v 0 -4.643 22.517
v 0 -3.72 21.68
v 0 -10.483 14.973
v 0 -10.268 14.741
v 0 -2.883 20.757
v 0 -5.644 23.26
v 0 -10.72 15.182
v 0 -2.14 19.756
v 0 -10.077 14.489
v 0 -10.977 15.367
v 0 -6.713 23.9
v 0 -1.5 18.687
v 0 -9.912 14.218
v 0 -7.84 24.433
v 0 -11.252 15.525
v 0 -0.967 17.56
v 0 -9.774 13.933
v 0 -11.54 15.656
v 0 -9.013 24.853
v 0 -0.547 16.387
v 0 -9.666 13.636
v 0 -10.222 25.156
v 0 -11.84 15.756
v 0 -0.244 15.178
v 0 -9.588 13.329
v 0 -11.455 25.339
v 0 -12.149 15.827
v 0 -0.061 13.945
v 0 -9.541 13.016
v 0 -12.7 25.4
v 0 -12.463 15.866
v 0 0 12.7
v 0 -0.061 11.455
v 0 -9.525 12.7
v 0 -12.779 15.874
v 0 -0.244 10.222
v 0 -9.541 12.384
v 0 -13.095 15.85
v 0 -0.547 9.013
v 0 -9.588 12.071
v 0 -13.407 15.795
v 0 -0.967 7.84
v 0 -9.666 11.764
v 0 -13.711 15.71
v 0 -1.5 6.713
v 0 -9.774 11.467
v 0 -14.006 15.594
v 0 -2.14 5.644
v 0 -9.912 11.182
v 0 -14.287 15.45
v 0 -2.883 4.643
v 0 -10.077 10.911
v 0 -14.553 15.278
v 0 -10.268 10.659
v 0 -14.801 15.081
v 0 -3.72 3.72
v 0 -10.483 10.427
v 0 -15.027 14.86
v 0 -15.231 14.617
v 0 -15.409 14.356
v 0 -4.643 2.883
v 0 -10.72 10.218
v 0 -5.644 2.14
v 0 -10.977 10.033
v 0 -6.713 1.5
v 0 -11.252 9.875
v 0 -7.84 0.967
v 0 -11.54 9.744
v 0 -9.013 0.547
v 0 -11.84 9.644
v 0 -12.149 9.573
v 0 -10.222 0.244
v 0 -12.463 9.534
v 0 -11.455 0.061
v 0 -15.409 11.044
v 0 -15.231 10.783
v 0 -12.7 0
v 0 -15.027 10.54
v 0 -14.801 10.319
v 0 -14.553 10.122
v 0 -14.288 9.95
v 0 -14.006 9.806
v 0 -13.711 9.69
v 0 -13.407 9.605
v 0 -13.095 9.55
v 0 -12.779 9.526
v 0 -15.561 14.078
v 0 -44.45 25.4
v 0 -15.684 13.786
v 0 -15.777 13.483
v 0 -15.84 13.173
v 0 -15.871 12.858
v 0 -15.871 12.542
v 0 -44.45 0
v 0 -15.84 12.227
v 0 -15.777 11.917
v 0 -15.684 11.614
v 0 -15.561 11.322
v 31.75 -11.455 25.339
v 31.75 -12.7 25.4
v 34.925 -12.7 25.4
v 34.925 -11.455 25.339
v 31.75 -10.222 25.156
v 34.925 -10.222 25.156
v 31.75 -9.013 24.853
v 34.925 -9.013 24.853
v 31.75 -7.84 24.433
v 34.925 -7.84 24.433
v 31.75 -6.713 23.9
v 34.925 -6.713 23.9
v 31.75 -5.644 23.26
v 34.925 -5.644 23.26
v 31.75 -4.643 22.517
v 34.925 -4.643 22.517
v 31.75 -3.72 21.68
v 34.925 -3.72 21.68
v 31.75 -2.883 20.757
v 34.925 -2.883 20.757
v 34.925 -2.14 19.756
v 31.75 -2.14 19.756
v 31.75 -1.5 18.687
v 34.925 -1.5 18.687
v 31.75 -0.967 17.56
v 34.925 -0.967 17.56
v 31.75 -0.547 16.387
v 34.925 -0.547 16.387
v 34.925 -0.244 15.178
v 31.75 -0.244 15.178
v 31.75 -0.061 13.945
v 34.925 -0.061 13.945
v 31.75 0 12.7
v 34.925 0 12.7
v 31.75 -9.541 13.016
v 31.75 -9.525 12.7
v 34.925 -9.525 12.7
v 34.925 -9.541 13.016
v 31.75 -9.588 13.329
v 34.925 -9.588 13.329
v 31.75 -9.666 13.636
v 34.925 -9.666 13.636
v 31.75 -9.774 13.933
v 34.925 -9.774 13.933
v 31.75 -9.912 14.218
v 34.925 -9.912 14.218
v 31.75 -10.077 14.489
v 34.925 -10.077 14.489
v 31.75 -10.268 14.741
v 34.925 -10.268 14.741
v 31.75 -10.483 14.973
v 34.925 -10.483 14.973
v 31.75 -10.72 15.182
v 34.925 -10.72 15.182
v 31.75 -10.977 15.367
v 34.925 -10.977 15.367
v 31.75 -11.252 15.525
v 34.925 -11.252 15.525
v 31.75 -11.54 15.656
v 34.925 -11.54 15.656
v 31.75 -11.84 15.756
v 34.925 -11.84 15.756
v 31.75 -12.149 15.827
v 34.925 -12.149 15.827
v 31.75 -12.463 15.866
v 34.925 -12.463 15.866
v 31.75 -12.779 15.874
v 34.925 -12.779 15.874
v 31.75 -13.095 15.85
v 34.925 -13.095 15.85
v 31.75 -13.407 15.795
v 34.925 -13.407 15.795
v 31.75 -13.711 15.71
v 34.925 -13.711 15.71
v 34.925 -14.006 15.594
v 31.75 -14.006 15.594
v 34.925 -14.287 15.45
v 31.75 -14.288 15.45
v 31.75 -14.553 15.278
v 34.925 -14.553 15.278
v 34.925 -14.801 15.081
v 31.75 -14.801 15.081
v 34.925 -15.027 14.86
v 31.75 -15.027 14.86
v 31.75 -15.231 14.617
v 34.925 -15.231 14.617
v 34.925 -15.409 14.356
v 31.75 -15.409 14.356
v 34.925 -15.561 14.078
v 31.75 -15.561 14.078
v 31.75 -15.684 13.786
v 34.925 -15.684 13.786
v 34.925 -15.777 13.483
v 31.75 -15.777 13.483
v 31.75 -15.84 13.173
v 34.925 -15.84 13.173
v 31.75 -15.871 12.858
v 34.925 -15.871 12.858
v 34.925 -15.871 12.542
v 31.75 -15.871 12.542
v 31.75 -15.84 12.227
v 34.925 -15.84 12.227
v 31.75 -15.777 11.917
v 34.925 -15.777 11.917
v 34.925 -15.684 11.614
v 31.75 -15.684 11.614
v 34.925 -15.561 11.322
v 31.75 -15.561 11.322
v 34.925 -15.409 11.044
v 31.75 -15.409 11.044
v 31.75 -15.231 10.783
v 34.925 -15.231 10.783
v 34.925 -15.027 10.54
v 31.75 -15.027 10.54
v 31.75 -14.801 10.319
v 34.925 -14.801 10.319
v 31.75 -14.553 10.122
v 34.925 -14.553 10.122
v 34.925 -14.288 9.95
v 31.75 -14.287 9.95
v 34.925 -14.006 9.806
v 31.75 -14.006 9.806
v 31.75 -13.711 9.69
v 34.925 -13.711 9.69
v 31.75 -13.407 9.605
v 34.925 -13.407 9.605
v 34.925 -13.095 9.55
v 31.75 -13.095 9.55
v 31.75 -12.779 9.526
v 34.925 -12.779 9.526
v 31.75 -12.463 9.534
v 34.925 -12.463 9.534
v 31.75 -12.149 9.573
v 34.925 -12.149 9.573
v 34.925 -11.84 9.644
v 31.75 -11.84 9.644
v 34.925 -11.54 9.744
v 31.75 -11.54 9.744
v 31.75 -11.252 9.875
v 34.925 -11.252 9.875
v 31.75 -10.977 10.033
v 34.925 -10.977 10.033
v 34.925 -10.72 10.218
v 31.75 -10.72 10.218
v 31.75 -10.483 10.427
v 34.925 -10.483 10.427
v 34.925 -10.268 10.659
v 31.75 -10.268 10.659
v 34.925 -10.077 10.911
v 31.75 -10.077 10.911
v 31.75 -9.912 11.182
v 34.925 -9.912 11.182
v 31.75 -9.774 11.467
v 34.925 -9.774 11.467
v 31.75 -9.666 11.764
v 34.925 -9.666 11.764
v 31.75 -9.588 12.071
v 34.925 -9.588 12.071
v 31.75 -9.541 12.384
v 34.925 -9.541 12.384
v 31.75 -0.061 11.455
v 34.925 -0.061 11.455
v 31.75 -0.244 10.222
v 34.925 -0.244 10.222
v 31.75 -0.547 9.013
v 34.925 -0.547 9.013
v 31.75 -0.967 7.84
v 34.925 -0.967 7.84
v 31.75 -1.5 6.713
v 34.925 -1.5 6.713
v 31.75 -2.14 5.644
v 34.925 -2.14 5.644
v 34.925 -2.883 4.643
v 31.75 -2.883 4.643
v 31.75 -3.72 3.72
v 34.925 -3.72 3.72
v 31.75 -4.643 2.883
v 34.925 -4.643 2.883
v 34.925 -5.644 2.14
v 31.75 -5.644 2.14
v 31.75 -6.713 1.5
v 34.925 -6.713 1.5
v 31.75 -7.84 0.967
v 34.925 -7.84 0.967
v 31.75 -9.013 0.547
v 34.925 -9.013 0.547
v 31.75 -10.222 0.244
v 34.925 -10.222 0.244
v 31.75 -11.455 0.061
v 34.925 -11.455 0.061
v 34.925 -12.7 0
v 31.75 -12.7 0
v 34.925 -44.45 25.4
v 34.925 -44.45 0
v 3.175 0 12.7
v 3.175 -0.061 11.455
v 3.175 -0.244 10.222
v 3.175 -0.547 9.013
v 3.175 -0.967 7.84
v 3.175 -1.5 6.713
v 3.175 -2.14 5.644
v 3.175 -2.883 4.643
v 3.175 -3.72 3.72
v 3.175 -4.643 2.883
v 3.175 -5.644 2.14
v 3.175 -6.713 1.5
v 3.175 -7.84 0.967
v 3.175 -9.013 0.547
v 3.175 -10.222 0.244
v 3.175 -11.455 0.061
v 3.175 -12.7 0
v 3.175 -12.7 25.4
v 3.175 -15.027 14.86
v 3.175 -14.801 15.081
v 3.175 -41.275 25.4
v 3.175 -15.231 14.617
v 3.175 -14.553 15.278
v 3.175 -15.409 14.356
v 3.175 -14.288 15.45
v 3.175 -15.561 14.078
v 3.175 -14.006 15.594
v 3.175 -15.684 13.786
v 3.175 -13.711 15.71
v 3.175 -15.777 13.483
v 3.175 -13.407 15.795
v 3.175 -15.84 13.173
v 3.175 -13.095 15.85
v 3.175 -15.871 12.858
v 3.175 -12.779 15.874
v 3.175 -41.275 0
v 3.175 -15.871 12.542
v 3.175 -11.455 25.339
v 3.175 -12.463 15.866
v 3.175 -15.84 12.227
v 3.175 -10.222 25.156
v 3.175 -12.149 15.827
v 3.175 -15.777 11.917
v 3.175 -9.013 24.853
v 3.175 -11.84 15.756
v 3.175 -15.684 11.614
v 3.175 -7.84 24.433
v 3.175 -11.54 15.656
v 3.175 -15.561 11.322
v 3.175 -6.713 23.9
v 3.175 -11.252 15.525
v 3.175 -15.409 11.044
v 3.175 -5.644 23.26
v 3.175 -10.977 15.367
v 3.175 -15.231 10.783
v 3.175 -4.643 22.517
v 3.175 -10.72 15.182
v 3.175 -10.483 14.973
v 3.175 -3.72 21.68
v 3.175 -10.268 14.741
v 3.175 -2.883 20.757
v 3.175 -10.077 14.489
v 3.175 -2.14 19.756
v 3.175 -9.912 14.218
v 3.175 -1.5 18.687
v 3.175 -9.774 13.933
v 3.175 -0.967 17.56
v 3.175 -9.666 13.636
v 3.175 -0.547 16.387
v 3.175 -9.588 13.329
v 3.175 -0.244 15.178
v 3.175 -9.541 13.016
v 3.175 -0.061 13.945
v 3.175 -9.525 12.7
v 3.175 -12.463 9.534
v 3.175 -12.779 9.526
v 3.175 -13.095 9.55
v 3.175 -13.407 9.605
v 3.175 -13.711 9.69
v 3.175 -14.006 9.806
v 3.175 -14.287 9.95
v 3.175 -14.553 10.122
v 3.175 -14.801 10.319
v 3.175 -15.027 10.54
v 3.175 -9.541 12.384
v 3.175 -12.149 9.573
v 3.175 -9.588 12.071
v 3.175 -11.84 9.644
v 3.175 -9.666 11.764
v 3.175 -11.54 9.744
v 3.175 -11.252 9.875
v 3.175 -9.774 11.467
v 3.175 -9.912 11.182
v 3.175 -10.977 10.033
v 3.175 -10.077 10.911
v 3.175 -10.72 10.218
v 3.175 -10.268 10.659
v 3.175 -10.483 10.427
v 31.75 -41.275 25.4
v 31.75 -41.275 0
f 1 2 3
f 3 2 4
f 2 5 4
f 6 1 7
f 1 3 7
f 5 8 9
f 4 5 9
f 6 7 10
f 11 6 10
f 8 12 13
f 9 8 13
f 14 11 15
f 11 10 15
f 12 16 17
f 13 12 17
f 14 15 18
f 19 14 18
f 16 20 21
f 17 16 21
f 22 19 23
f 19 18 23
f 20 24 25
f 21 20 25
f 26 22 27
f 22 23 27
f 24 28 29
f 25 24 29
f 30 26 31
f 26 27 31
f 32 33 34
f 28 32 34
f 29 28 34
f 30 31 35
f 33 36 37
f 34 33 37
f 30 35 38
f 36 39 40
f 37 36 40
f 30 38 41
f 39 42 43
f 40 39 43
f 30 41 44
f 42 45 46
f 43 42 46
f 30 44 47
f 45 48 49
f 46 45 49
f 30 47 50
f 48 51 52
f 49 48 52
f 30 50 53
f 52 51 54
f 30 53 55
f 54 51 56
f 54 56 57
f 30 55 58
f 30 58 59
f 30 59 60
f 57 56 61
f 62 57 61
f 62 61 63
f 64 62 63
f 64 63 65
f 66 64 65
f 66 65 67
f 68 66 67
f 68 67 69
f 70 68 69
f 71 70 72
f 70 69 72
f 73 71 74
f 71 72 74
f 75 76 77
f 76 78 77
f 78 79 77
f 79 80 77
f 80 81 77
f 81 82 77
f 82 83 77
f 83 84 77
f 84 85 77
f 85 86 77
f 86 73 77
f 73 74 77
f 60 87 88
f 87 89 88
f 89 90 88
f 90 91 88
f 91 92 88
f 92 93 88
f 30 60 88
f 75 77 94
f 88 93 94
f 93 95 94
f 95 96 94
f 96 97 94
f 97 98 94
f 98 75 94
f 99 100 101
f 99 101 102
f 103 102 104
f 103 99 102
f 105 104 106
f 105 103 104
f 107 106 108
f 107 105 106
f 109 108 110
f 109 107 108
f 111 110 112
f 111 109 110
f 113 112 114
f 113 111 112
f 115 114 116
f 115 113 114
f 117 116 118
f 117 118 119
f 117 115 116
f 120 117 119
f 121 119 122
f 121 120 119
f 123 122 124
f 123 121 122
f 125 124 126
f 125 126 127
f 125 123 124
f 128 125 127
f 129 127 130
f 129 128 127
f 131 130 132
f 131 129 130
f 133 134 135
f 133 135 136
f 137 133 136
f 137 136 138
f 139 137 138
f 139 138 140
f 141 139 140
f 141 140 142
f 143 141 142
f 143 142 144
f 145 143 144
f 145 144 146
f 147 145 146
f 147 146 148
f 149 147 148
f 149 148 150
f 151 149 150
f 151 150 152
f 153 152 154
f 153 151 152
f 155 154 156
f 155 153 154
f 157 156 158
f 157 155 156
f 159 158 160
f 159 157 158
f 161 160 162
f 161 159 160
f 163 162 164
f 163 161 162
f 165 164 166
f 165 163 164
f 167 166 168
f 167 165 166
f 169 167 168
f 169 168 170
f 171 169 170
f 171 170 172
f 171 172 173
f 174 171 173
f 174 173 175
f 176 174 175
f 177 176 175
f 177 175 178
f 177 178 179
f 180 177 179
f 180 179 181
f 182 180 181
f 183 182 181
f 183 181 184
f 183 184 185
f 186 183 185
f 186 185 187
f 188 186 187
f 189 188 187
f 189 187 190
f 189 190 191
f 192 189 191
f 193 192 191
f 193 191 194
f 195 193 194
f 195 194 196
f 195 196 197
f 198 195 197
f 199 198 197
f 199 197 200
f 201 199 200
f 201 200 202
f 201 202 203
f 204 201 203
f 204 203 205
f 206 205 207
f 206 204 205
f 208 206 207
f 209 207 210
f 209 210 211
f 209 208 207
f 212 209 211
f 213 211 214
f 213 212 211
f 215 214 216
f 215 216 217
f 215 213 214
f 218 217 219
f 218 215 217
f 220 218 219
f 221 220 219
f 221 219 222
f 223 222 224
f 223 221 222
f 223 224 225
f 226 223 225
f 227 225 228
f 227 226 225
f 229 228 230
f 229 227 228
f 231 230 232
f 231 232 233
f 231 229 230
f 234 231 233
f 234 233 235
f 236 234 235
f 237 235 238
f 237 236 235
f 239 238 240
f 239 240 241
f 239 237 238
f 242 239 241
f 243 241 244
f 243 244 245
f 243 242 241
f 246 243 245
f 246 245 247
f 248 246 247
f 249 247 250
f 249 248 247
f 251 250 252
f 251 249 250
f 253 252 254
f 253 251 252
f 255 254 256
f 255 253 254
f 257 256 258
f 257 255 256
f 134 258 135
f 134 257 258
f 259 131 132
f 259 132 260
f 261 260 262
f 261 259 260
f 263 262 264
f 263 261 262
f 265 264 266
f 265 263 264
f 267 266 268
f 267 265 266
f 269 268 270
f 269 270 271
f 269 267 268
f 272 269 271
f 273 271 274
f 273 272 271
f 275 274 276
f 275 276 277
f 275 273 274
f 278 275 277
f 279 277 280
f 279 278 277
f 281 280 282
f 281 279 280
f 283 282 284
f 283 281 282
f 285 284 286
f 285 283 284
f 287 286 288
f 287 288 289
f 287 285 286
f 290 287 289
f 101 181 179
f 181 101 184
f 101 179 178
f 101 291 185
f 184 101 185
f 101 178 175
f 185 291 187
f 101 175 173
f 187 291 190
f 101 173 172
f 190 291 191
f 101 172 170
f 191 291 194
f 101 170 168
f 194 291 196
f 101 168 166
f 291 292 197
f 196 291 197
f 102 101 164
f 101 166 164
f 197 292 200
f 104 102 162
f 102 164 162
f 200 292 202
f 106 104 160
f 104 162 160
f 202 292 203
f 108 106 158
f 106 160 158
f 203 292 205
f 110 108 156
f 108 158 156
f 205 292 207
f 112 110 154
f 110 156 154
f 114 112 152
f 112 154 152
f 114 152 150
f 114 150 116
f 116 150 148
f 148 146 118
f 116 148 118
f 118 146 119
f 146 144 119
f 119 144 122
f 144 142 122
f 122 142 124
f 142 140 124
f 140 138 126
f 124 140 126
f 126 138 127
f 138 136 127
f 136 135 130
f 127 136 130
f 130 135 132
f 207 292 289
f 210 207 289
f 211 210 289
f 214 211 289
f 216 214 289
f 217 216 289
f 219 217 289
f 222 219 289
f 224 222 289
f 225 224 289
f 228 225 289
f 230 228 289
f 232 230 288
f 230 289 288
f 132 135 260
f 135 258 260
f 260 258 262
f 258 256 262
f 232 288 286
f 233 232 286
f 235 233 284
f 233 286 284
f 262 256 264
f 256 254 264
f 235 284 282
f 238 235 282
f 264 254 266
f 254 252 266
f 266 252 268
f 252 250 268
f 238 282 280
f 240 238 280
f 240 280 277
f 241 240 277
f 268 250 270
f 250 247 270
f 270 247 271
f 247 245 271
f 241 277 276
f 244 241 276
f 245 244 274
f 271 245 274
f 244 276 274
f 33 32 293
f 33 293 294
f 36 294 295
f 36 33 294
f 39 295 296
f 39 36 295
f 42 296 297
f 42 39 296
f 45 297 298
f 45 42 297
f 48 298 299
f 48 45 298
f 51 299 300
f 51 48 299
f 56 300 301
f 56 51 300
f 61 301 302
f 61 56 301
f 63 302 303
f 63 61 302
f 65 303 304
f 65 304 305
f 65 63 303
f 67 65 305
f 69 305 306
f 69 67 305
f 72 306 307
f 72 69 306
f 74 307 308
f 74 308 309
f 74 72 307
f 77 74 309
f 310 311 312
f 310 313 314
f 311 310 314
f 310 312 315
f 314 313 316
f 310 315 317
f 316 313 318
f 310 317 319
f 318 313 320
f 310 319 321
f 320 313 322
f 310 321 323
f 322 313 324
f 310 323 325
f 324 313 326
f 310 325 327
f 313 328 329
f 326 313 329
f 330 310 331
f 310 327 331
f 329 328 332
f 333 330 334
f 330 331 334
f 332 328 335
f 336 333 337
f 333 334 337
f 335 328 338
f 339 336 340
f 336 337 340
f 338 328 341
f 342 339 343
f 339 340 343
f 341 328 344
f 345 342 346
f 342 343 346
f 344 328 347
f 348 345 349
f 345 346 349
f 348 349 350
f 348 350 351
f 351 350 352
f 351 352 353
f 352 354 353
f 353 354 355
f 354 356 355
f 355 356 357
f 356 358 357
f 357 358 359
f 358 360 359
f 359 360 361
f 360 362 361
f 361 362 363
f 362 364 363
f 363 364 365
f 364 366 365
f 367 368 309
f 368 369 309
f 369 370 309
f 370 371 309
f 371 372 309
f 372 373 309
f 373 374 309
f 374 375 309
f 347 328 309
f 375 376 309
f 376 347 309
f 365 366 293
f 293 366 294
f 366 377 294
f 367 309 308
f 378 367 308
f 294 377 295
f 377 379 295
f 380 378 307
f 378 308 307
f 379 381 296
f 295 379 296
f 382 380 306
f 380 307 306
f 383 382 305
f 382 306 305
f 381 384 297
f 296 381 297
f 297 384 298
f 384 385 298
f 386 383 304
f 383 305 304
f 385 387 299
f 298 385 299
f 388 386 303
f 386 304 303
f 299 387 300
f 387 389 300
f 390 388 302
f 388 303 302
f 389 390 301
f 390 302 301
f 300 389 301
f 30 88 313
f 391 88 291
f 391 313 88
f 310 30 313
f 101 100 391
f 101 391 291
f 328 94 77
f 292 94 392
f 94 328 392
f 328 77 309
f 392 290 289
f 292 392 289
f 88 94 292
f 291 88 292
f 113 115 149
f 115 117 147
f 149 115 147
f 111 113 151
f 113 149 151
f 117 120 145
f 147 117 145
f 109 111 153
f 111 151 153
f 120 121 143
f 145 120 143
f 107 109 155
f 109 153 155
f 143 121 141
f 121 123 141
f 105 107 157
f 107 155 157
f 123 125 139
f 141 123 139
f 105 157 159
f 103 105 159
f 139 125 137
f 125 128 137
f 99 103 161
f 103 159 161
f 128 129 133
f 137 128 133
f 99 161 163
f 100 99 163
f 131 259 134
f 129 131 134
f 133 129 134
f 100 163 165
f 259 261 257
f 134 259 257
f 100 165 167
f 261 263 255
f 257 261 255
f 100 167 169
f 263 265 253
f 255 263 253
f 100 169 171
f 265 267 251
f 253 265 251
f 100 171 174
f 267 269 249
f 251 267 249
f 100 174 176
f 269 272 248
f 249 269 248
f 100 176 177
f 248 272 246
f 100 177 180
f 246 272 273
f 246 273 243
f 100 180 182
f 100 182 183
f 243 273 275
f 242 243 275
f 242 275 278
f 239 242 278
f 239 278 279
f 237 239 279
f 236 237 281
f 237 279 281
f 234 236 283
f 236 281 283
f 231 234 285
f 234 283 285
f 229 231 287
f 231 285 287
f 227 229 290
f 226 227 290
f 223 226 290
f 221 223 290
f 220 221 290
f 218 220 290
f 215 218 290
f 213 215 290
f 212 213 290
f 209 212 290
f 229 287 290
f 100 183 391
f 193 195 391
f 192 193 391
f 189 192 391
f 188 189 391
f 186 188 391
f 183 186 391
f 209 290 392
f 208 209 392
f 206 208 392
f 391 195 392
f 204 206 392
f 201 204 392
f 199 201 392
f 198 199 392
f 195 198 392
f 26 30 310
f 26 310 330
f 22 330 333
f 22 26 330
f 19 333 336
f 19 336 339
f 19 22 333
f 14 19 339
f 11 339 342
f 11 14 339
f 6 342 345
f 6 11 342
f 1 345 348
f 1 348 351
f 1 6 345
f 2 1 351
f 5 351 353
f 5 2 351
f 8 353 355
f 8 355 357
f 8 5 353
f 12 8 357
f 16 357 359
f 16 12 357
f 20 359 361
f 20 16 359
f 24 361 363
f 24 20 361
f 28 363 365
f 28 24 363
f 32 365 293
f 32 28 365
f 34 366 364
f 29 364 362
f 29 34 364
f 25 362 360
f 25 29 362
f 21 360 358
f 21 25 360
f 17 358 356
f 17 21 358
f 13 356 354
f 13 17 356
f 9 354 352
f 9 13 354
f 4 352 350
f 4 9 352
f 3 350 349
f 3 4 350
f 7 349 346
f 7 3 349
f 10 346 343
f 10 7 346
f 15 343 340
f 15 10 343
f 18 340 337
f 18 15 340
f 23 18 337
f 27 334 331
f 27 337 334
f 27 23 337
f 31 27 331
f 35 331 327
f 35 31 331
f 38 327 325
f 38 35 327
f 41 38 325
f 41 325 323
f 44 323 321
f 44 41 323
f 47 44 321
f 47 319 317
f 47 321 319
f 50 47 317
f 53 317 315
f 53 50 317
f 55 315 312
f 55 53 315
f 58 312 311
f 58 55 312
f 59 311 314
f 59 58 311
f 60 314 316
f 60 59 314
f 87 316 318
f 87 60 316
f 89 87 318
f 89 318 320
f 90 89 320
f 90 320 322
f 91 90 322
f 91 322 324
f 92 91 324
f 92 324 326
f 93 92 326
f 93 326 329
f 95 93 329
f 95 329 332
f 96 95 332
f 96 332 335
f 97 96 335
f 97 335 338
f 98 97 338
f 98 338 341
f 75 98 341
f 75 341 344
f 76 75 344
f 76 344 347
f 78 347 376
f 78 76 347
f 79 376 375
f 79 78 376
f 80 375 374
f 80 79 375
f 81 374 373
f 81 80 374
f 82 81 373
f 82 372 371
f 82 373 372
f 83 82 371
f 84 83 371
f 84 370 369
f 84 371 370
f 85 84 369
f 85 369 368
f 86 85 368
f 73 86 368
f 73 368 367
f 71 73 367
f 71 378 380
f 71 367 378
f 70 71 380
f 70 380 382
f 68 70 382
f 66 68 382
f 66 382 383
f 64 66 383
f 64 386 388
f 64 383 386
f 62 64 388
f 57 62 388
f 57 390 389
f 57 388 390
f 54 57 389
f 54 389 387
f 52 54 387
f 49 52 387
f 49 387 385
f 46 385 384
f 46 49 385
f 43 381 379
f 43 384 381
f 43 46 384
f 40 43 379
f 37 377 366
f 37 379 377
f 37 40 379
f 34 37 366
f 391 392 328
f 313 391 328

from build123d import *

# Parameters (mm, degrees)
F1_DEPTH = 25.4
F2_R     = 3.175
F3_DEPTH = 34.925


with BuildPart() as f1:
    # F0 (on Top) → F1 (new body)
    with BuildSketch(Plane.XY):
        Polygon((3.175, 0), (0, 0), (0, -44.45), (34.925, -44.45), (34.925, 0), (31.75, 0), (31.75, -41.275), (3.175, -41.275), align=None)
    extrude(amount=F1_DEPTH)

    # F2 (on Right) → F3 (cut)
    with BuildSketch(Plane.YZ):
        with BuildLine():
            Line((0, 0), (0, 12.7))
            ThreePointArc((0, 12.7), (-3.719744, 3.719744), (-12.7, 0))
            Line((-12.7, 0), (0, 0))
        make_face()
        with BuildLine():
            ThreePointArc((-12.7, 25.4), (-3.719744, 21.680256), (0, 12.7))
            Line((0, 12.7), (0, 25.4))
            Line((0, 25.4), (-12.7, 25.4))
        make_face()
        with Locations((-12.7, 12.7)):
            Circle(F2_R)
    extrude(amount=F3_DEPTH, mode=Mode.SUBTRACT)


solid = f1.part
